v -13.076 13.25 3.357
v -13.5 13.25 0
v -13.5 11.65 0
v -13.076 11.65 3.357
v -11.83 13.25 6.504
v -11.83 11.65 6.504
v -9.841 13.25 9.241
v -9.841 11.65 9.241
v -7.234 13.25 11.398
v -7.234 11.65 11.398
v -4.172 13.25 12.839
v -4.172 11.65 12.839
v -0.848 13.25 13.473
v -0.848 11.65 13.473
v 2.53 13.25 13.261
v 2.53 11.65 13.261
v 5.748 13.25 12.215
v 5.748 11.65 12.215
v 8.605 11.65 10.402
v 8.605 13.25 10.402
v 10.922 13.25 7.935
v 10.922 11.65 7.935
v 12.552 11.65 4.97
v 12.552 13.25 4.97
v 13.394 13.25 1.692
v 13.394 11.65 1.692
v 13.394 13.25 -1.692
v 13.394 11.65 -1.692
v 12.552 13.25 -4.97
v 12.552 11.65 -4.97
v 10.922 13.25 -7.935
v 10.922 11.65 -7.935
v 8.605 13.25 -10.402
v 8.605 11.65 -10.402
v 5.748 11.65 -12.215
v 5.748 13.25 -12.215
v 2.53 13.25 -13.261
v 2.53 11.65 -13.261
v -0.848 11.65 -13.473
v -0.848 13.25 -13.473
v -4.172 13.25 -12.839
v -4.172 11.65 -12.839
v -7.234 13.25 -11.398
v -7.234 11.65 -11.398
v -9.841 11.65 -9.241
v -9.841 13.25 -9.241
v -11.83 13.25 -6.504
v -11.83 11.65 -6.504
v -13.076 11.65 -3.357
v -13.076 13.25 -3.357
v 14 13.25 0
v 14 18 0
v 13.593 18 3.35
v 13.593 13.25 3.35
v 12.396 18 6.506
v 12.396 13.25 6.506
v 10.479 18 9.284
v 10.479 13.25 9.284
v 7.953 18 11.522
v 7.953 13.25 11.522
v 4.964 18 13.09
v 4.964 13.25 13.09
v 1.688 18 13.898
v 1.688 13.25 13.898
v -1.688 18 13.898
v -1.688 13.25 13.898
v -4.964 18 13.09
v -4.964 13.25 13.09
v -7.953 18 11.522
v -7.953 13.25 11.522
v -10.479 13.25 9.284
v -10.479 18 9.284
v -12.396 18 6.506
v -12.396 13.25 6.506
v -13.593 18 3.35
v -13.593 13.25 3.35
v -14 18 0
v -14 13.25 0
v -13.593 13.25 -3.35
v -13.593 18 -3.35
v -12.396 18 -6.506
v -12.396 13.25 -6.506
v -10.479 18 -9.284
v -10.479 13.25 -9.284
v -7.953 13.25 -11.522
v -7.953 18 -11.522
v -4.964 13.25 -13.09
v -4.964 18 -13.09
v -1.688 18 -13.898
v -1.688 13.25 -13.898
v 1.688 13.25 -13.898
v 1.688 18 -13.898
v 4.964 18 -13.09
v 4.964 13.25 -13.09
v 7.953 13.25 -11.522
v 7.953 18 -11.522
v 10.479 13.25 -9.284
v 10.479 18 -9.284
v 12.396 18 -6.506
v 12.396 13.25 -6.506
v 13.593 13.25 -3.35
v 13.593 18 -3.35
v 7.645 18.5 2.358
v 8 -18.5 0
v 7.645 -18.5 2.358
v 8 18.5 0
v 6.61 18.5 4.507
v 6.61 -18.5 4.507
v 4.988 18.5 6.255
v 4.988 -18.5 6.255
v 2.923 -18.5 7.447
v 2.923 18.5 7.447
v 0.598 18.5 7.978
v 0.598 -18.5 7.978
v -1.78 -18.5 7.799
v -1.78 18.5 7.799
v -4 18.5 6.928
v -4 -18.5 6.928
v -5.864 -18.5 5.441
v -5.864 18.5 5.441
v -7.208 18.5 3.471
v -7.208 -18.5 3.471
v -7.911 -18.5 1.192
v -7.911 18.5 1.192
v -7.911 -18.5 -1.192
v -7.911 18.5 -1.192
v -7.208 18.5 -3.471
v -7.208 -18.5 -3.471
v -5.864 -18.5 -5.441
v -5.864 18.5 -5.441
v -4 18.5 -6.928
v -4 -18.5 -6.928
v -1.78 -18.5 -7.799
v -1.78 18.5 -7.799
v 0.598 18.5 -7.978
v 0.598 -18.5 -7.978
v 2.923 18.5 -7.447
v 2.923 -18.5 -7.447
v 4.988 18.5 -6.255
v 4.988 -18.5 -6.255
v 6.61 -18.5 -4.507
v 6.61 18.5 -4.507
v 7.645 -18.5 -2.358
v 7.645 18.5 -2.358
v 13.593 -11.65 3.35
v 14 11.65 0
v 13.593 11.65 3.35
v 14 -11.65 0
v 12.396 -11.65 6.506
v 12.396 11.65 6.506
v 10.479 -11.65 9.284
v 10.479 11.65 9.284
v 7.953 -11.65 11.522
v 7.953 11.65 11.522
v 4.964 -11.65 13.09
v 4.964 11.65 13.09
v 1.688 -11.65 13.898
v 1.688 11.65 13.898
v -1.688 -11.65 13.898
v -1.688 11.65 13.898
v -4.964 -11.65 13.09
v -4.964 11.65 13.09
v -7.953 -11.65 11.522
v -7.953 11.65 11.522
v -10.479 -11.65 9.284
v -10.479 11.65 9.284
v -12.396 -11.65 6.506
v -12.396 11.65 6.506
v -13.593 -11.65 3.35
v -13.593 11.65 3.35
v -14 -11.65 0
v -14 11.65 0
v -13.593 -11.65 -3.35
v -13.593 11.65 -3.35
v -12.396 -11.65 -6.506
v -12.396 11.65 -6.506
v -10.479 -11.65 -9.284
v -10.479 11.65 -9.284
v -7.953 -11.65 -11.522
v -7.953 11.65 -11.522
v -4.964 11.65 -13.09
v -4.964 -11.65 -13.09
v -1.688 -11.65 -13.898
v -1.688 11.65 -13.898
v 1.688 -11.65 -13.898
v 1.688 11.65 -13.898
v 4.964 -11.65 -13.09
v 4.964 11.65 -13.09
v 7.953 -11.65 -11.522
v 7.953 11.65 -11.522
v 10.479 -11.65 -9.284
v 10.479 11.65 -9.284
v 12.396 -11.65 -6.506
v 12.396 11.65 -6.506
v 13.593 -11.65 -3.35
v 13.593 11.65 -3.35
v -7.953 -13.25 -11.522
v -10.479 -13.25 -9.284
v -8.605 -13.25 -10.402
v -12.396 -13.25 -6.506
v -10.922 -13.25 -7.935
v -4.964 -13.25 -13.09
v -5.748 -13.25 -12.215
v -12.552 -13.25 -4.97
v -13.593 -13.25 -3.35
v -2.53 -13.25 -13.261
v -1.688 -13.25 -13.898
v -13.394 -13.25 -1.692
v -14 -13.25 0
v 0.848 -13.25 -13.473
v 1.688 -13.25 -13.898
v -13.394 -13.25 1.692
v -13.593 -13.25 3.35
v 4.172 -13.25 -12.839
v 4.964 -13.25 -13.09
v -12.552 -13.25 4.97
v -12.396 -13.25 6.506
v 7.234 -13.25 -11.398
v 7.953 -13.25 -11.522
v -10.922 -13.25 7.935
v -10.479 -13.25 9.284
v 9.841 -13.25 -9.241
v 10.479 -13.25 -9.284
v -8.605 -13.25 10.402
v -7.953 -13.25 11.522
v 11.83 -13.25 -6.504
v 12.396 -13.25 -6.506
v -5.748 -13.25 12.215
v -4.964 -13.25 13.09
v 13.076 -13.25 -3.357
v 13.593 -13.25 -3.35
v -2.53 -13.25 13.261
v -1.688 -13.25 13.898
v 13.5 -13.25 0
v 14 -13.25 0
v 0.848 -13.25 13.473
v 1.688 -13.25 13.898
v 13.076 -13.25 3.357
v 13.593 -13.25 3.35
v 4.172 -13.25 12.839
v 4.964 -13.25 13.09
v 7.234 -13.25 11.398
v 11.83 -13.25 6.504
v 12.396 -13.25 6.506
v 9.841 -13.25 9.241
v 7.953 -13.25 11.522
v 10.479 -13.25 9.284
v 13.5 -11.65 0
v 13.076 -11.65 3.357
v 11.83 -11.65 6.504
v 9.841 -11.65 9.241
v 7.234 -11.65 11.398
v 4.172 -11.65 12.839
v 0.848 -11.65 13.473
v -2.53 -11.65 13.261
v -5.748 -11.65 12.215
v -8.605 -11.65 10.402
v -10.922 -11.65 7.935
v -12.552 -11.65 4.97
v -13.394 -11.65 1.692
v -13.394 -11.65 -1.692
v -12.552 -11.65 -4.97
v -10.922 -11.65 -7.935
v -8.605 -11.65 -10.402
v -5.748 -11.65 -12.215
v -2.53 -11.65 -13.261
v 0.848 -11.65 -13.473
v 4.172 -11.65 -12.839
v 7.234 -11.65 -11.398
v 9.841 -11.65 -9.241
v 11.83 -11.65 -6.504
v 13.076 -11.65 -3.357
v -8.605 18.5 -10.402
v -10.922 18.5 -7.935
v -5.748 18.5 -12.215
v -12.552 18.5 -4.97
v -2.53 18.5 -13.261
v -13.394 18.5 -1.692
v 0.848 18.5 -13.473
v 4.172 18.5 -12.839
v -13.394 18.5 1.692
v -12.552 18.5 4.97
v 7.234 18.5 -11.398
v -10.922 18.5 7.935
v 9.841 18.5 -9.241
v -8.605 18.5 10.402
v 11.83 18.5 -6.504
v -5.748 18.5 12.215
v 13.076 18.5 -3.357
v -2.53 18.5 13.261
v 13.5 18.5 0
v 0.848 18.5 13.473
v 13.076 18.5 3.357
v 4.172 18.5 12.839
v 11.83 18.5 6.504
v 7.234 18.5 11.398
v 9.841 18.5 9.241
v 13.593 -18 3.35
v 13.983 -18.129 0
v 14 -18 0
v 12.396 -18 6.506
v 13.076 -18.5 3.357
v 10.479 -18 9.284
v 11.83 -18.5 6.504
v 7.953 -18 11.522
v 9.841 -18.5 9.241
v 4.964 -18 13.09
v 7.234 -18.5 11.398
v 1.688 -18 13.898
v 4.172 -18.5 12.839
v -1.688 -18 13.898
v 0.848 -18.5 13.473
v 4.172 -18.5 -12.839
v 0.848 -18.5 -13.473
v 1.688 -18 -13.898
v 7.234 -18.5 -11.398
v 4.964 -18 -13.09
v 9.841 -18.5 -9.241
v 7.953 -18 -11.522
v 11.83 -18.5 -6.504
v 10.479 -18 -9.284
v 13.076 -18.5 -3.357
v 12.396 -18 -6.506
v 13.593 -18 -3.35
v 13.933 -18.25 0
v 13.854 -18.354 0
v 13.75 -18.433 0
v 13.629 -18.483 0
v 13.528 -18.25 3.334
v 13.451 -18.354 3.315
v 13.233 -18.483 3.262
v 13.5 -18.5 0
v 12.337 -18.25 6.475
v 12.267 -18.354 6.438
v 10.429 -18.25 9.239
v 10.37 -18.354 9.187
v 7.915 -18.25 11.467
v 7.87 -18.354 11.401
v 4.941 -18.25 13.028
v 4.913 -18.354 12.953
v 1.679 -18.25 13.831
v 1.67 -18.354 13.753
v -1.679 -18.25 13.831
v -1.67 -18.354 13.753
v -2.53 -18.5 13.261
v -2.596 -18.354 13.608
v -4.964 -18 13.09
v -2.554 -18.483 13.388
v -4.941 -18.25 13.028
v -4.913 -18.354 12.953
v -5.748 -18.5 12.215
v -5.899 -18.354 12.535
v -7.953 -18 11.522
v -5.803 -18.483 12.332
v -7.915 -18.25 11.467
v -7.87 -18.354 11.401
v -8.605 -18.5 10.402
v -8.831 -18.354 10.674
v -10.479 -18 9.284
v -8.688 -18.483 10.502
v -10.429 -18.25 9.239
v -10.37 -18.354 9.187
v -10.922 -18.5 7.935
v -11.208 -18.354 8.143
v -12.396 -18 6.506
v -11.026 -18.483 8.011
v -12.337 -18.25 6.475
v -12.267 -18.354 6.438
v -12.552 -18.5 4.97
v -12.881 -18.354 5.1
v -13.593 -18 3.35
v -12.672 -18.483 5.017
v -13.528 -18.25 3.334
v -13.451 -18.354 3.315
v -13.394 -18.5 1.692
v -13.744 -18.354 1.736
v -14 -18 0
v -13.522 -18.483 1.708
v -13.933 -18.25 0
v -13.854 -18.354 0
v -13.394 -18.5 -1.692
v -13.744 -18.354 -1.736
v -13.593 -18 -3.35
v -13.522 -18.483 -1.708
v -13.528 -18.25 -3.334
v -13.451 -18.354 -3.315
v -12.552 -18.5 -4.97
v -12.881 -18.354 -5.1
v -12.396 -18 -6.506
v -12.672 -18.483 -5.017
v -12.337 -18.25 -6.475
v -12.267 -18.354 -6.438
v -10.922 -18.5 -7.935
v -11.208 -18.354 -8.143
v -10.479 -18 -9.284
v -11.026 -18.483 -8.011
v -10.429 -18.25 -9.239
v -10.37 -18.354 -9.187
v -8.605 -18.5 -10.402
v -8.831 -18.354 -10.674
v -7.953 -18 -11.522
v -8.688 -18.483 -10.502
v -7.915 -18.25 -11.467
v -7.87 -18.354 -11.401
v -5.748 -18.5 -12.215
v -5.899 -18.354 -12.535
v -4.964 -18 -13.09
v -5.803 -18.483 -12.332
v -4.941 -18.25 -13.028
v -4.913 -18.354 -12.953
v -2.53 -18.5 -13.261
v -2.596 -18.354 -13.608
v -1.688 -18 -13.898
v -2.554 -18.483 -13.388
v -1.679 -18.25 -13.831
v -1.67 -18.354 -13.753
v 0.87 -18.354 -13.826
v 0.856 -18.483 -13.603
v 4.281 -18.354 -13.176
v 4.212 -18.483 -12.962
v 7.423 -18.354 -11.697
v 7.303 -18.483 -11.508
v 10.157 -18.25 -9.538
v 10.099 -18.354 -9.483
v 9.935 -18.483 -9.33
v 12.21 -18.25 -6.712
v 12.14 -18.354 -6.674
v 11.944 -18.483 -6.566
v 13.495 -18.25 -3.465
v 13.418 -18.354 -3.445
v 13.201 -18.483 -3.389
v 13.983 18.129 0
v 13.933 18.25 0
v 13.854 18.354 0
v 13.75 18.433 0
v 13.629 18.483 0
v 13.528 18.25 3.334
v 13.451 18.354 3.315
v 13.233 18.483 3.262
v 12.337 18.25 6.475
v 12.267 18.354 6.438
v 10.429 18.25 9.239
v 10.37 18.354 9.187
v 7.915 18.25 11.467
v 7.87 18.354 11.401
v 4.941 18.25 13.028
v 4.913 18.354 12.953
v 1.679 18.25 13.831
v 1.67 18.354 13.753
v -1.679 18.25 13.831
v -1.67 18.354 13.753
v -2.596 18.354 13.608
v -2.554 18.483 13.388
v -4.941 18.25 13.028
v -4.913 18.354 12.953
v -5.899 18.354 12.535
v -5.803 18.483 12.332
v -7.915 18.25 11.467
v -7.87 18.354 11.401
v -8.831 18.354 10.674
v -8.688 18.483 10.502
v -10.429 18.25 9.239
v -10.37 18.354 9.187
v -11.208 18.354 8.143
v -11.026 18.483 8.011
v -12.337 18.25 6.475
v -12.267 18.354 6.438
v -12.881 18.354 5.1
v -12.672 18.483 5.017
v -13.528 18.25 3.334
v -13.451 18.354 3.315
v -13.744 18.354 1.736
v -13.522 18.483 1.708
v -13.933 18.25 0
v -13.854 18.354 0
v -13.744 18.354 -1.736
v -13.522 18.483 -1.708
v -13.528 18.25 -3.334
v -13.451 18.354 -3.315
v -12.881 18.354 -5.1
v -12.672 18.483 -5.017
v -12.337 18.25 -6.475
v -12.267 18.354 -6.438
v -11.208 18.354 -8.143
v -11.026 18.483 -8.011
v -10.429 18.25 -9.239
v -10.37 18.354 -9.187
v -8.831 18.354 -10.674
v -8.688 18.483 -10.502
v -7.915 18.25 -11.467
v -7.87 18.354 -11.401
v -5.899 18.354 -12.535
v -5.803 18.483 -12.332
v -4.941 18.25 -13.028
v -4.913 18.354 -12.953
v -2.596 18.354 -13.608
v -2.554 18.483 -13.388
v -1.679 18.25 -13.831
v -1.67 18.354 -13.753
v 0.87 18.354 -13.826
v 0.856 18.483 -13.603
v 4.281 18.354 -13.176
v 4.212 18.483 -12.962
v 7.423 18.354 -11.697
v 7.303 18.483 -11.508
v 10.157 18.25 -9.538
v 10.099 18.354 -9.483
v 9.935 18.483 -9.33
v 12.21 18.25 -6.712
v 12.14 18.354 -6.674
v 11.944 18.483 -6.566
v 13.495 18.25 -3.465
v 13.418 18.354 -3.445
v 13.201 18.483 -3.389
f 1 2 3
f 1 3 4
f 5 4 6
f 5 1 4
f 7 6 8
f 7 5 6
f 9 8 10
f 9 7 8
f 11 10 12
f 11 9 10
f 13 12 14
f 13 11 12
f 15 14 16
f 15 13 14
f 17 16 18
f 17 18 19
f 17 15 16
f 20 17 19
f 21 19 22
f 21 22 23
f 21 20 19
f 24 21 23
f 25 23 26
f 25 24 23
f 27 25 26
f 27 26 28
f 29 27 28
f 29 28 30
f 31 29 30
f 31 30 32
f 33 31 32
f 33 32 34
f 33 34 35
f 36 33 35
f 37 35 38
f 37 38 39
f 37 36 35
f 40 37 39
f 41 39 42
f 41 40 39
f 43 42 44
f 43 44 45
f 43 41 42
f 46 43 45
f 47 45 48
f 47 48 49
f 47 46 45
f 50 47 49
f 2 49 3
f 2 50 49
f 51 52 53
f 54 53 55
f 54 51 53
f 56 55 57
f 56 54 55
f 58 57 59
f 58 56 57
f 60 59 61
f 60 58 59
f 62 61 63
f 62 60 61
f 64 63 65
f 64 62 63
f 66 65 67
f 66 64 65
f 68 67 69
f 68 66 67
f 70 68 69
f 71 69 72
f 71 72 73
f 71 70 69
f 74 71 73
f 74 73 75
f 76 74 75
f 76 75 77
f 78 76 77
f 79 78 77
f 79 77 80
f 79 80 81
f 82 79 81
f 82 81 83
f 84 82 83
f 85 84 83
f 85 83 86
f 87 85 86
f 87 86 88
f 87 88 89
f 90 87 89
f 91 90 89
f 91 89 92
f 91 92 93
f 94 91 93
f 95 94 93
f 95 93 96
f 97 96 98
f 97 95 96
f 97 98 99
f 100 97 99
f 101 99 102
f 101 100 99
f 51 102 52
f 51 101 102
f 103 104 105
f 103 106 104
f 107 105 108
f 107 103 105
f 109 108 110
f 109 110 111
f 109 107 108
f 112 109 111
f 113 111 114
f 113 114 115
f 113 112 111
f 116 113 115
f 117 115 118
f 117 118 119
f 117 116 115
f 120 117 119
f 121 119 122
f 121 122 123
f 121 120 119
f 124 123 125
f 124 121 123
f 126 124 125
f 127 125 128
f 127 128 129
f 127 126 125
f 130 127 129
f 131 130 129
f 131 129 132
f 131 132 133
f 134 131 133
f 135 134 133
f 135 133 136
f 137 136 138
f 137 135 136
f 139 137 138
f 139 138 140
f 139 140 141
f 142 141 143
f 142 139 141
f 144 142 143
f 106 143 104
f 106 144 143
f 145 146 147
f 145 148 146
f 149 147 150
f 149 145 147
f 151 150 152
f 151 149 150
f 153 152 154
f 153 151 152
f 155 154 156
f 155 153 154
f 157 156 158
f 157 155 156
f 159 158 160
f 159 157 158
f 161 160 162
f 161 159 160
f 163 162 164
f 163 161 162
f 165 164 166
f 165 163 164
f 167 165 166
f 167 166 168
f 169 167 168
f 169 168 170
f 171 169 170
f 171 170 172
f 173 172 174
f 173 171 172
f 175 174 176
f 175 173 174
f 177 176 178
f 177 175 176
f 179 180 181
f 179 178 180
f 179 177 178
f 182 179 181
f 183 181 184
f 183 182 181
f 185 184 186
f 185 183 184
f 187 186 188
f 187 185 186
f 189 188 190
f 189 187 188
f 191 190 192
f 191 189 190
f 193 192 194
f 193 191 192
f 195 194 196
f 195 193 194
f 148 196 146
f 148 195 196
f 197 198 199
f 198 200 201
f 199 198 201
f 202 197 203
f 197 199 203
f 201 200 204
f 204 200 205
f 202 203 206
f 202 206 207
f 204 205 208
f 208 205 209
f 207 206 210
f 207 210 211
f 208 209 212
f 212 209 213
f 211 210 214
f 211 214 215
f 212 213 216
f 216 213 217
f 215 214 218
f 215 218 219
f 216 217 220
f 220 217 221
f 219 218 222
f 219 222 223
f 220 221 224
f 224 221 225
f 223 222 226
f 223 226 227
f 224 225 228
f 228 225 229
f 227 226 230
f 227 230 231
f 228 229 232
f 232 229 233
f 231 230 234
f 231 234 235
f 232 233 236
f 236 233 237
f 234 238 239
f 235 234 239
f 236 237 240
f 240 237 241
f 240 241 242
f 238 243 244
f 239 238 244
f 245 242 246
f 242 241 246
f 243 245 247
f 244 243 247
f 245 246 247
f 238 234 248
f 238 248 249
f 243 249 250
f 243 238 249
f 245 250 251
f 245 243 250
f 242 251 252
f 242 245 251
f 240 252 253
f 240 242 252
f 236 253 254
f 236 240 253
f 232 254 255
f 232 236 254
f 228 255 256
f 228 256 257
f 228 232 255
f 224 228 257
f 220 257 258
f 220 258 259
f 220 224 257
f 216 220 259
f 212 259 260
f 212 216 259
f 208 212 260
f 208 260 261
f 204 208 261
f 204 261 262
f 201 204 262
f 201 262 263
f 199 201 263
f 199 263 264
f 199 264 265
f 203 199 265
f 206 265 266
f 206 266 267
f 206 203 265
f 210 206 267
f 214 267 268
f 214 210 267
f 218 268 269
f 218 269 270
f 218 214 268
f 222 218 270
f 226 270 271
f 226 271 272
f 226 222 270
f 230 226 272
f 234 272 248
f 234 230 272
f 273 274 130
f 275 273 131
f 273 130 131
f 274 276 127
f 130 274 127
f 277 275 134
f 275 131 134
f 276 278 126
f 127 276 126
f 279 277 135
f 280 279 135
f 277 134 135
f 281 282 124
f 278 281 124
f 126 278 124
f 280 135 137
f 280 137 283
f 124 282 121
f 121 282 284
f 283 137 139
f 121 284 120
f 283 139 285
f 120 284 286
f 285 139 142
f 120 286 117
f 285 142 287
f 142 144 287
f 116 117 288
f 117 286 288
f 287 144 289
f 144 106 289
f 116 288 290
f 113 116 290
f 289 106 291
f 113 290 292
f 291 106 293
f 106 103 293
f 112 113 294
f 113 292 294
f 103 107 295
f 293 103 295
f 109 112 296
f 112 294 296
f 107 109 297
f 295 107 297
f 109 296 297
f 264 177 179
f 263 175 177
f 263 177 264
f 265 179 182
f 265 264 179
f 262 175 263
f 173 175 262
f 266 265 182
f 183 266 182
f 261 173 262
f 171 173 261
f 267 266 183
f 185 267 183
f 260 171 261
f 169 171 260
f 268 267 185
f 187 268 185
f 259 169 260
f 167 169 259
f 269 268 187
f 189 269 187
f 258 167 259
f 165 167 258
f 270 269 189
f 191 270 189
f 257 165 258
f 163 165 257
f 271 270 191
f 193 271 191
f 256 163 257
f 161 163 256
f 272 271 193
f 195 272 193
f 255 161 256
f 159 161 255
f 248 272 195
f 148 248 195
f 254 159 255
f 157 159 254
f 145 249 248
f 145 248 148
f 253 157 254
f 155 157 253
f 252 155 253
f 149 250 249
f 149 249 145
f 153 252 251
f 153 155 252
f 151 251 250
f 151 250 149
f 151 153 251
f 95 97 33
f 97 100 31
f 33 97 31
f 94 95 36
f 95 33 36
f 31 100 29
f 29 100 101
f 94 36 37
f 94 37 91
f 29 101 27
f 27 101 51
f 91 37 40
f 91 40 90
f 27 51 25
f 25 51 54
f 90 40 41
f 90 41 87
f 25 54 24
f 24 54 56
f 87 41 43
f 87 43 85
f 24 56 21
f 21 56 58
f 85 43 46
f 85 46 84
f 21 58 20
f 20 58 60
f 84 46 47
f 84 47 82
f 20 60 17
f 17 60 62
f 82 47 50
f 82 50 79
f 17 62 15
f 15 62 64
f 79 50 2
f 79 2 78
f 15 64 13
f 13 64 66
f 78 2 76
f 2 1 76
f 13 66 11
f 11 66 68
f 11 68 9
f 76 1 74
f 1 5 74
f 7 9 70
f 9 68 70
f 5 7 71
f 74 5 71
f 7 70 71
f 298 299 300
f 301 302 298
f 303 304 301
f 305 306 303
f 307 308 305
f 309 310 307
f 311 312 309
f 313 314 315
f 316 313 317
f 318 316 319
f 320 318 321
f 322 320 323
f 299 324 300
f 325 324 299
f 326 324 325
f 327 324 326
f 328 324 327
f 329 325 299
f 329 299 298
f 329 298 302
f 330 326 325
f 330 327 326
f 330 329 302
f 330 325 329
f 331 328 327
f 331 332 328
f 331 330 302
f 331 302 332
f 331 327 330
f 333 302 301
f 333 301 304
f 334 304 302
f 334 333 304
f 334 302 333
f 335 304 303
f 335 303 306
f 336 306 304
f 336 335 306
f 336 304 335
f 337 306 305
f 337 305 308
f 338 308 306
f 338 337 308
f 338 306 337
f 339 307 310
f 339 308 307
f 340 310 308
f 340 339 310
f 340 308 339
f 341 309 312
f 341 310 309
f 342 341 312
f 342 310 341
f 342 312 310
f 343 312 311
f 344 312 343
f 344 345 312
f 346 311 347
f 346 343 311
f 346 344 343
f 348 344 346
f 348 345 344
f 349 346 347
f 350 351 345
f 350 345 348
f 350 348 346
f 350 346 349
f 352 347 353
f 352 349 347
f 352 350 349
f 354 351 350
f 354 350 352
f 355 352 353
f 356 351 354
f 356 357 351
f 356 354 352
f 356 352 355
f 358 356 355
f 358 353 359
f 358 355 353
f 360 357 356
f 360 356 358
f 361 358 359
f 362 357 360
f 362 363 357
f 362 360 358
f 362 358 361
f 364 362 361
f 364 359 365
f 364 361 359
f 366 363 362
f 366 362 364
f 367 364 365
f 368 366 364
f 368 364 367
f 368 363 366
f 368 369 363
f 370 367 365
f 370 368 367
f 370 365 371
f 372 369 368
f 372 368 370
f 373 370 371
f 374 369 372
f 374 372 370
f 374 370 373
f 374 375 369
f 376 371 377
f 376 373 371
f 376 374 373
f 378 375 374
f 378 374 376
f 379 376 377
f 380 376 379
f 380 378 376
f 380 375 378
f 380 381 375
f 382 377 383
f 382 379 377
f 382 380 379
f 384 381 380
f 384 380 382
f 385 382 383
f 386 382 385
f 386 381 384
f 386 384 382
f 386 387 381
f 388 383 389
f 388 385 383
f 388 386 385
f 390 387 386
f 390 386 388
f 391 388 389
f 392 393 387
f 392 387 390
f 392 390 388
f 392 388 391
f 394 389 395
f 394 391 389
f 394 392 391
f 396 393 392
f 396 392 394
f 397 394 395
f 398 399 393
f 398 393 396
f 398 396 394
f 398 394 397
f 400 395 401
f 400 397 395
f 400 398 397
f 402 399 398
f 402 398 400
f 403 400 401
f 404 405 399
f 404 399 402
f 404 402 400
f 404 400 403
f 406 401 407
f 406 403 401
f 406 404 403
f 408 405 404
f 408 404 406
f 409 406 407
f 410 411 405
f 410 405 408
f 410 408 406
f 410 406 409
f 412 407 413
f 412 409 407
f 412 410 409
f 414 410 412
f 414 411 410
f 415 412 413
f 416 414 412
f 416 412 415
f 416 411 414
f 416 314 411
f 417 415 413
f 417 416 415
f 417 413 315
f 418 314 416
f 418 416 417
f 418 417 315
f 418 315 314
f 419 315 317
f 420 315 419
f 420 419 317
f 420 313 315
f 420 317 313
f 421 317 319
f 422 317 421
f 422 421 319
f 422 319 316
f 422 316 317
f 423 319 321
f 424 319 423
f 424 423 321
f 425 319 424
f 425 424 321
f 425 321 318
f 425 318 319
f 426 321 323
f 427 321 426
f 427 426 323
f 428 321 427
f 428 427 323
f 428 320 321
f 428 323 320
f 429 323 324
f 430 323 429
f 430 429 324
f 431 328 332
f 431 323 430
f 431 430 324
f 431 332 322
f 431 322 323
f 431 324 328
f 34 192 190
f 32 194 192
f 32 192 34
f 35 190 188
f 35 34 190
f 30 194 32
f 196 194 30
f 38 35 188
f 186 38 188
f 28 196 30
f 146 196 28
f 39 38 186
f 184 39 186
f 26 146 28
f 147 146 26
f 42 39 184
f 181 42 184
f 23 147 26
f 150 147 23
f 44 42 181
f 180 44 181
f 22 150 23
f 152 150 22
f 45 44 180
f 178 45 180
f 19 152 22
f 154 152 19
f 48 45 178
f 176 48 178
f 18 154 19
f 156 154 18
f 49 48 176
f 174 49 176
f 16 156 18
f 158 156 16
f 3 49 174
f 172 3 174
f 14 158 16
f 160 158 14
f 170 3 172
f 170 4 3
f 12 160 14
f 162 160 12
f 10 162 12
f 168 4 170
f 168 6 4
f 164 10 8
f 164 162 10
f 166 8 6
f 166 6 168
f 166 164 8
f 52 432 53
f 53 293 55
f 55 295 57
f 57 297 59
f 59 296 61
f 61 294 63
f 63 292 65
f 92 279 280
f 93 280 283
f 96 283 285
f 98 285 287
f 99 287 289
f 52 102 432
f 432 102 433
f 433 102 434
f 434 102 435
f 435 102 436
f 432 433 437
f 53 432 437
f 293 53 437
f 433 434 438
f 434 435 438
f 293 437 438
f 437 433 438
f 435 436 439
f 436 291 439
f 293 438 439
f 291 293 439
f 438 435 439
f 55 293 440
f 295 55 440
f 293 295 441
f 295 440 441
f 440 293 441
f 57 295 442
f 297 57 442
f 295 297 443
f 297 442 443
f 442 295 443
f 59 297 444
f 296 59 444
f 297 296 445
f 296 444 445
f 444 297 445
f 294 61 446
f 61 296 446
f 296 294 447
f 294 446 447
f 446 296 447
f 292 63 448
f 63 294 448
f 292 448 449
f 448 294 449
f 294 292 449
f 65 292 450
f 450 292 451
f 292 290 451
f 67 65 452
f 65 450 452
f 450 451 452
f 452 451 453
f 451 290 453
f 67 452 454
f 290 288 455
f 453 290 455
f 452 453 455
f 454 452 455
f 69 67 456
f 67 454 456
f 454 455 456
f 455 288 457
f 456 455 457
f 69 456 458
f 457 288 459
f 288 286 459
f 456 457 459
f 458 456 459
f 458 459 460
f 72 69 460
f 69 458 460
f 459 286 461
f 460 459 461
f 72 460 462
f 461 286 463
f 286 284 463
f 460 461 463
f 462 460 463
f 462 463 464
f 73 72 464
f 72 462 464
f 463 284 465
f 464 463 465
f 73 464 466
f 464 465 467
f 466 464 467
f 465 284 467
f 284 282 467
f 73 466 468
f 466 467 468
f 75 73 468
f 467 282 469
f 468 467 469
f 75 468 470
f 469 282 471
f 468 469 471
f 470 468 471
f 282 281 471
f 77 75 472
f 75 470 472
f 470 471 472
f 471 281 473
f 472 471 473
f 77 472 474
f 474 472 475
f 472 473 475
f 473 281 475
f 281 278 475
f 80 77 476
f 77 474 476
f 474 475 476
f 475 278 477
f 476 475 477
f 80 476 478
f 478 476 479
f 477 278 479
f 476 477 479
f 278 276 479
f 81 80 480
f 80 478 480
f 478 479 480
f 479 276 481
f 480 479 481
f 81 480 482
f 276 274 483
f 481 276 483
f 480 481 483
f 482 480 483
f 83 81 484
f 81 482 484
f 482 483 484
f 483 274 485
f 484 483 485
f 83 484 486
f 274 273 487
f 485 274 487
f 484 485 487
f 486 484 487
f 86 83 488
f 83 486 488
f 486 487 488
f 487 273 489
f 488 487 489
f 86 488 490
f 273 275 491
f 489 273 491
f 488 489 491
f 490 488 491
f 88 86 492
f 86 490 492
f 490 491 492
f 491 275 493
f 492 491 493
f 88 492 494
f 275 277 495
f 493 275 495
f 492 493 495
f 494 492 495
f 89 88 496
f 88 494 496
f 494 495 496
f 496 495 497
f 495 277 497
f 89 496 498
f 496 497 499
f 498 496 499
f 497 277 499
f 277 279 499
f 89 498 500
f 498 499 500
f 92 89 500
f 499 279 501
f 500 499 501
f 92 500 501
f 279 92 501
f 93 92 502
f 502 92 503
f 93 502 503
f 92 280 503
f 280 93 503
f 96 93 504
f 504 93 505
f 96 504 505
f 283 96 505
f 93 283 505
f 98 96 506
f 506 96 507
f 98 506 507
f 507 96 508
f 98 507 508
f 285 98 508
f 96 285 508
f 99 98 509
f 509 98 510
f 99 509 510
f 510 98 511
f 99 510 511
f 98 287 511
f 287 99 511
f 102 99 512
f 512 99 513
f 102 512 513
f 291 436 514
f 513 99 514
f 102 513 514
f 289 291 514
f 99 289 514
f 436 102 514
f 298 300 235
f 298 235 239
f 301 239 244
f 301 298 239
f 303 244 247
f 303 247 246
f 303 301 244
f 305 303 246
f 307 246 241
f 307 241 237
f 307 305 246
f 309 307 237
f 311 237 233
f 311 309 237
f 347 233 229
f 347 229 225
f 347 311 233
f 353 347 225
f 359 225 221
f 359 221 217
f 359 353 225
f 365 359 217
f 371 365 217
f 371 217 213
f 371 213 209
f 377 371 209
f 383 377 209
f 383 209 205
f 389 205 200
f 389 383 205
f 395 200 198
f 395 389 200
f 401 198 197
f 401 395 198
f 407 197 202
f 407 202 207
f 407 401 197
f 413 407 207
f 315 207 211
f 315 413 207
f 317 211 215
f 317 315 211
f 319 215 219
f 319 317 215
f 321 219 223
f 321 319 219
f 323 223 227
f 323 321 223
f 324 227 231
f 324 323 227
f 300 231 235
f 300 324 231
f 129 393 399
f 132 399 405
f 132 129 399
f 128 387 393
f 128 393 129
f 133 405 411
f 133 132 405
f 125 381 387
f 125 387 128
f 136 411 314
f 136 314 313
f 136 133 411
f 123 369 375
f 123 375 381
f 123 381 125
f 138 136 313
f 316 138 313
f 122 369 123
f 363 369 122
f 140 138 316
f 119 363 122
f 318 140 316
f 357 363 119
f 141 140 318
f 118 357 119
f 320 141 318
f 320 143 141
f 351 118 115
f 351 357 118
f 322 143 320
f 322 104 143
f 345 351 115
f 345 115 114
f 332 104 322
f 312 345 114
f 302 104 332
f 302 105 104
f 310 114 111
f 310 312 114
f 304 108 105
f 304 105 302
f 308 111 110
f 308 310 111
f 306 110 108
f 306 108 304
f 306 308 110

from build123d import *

# Parameters (mm, degrees)
F0_R     = 14
F0_R_2   = 8
F1_DEPTH = 18.5
F3_START = -5.25
F2_R     = 16.723627754
F2_R_2   = 13.5
F3_DEPTH = 1.6
F5_START = -5.25
F4_R     = 14
F4_R_2   = 13.5
F5_DEPTH = 1.6
F6_R     = 0.5


with BuildPart() as f1:
    # F0 (on Front) → F1 (new body, symmetric)
    with BuildSketch(Plane.XZ):
        Circle(F0_R)
        Circle(F0_R_2, mode=Mode.SUBTRACT)
    extrude(amount=F1_DEPTH, both=True)

    # F2 (on face) → F3 (cut)
    with BuildSketch(Plane.XZ.offset(18.5).offset(F3_START)):
        Circle(F2_R)
        Circle(F2_R_2, mode=Mode.SUBTRACT)
    extrude(amount=-F3_DEPTH, mode=Mode.SUBTRACT)

    # F4 (on face) → F5 (cut)
    with BuildSketch(Plane(origin=(0, 18.5, 0), x_dir=(-1, 0, 0), z_dir=(0, 1, 0)).offset(F5_START)):
        Circle(F4_R)
        Circle(F4_R_2, mode=Mode.SUBTRACT)
    extrude(amount=-F5_DEPTH, mode=Mode.SUBTRACT)

    # F6
    f6_edges = [f1.edges().sort_by_distance(p)[0] for p in [
        (-14, 18.5, 0),
        (-14, -18.5, 0),
    ]]
    fillet(f6_edges, radius=F6_R)


solid = f1.part
